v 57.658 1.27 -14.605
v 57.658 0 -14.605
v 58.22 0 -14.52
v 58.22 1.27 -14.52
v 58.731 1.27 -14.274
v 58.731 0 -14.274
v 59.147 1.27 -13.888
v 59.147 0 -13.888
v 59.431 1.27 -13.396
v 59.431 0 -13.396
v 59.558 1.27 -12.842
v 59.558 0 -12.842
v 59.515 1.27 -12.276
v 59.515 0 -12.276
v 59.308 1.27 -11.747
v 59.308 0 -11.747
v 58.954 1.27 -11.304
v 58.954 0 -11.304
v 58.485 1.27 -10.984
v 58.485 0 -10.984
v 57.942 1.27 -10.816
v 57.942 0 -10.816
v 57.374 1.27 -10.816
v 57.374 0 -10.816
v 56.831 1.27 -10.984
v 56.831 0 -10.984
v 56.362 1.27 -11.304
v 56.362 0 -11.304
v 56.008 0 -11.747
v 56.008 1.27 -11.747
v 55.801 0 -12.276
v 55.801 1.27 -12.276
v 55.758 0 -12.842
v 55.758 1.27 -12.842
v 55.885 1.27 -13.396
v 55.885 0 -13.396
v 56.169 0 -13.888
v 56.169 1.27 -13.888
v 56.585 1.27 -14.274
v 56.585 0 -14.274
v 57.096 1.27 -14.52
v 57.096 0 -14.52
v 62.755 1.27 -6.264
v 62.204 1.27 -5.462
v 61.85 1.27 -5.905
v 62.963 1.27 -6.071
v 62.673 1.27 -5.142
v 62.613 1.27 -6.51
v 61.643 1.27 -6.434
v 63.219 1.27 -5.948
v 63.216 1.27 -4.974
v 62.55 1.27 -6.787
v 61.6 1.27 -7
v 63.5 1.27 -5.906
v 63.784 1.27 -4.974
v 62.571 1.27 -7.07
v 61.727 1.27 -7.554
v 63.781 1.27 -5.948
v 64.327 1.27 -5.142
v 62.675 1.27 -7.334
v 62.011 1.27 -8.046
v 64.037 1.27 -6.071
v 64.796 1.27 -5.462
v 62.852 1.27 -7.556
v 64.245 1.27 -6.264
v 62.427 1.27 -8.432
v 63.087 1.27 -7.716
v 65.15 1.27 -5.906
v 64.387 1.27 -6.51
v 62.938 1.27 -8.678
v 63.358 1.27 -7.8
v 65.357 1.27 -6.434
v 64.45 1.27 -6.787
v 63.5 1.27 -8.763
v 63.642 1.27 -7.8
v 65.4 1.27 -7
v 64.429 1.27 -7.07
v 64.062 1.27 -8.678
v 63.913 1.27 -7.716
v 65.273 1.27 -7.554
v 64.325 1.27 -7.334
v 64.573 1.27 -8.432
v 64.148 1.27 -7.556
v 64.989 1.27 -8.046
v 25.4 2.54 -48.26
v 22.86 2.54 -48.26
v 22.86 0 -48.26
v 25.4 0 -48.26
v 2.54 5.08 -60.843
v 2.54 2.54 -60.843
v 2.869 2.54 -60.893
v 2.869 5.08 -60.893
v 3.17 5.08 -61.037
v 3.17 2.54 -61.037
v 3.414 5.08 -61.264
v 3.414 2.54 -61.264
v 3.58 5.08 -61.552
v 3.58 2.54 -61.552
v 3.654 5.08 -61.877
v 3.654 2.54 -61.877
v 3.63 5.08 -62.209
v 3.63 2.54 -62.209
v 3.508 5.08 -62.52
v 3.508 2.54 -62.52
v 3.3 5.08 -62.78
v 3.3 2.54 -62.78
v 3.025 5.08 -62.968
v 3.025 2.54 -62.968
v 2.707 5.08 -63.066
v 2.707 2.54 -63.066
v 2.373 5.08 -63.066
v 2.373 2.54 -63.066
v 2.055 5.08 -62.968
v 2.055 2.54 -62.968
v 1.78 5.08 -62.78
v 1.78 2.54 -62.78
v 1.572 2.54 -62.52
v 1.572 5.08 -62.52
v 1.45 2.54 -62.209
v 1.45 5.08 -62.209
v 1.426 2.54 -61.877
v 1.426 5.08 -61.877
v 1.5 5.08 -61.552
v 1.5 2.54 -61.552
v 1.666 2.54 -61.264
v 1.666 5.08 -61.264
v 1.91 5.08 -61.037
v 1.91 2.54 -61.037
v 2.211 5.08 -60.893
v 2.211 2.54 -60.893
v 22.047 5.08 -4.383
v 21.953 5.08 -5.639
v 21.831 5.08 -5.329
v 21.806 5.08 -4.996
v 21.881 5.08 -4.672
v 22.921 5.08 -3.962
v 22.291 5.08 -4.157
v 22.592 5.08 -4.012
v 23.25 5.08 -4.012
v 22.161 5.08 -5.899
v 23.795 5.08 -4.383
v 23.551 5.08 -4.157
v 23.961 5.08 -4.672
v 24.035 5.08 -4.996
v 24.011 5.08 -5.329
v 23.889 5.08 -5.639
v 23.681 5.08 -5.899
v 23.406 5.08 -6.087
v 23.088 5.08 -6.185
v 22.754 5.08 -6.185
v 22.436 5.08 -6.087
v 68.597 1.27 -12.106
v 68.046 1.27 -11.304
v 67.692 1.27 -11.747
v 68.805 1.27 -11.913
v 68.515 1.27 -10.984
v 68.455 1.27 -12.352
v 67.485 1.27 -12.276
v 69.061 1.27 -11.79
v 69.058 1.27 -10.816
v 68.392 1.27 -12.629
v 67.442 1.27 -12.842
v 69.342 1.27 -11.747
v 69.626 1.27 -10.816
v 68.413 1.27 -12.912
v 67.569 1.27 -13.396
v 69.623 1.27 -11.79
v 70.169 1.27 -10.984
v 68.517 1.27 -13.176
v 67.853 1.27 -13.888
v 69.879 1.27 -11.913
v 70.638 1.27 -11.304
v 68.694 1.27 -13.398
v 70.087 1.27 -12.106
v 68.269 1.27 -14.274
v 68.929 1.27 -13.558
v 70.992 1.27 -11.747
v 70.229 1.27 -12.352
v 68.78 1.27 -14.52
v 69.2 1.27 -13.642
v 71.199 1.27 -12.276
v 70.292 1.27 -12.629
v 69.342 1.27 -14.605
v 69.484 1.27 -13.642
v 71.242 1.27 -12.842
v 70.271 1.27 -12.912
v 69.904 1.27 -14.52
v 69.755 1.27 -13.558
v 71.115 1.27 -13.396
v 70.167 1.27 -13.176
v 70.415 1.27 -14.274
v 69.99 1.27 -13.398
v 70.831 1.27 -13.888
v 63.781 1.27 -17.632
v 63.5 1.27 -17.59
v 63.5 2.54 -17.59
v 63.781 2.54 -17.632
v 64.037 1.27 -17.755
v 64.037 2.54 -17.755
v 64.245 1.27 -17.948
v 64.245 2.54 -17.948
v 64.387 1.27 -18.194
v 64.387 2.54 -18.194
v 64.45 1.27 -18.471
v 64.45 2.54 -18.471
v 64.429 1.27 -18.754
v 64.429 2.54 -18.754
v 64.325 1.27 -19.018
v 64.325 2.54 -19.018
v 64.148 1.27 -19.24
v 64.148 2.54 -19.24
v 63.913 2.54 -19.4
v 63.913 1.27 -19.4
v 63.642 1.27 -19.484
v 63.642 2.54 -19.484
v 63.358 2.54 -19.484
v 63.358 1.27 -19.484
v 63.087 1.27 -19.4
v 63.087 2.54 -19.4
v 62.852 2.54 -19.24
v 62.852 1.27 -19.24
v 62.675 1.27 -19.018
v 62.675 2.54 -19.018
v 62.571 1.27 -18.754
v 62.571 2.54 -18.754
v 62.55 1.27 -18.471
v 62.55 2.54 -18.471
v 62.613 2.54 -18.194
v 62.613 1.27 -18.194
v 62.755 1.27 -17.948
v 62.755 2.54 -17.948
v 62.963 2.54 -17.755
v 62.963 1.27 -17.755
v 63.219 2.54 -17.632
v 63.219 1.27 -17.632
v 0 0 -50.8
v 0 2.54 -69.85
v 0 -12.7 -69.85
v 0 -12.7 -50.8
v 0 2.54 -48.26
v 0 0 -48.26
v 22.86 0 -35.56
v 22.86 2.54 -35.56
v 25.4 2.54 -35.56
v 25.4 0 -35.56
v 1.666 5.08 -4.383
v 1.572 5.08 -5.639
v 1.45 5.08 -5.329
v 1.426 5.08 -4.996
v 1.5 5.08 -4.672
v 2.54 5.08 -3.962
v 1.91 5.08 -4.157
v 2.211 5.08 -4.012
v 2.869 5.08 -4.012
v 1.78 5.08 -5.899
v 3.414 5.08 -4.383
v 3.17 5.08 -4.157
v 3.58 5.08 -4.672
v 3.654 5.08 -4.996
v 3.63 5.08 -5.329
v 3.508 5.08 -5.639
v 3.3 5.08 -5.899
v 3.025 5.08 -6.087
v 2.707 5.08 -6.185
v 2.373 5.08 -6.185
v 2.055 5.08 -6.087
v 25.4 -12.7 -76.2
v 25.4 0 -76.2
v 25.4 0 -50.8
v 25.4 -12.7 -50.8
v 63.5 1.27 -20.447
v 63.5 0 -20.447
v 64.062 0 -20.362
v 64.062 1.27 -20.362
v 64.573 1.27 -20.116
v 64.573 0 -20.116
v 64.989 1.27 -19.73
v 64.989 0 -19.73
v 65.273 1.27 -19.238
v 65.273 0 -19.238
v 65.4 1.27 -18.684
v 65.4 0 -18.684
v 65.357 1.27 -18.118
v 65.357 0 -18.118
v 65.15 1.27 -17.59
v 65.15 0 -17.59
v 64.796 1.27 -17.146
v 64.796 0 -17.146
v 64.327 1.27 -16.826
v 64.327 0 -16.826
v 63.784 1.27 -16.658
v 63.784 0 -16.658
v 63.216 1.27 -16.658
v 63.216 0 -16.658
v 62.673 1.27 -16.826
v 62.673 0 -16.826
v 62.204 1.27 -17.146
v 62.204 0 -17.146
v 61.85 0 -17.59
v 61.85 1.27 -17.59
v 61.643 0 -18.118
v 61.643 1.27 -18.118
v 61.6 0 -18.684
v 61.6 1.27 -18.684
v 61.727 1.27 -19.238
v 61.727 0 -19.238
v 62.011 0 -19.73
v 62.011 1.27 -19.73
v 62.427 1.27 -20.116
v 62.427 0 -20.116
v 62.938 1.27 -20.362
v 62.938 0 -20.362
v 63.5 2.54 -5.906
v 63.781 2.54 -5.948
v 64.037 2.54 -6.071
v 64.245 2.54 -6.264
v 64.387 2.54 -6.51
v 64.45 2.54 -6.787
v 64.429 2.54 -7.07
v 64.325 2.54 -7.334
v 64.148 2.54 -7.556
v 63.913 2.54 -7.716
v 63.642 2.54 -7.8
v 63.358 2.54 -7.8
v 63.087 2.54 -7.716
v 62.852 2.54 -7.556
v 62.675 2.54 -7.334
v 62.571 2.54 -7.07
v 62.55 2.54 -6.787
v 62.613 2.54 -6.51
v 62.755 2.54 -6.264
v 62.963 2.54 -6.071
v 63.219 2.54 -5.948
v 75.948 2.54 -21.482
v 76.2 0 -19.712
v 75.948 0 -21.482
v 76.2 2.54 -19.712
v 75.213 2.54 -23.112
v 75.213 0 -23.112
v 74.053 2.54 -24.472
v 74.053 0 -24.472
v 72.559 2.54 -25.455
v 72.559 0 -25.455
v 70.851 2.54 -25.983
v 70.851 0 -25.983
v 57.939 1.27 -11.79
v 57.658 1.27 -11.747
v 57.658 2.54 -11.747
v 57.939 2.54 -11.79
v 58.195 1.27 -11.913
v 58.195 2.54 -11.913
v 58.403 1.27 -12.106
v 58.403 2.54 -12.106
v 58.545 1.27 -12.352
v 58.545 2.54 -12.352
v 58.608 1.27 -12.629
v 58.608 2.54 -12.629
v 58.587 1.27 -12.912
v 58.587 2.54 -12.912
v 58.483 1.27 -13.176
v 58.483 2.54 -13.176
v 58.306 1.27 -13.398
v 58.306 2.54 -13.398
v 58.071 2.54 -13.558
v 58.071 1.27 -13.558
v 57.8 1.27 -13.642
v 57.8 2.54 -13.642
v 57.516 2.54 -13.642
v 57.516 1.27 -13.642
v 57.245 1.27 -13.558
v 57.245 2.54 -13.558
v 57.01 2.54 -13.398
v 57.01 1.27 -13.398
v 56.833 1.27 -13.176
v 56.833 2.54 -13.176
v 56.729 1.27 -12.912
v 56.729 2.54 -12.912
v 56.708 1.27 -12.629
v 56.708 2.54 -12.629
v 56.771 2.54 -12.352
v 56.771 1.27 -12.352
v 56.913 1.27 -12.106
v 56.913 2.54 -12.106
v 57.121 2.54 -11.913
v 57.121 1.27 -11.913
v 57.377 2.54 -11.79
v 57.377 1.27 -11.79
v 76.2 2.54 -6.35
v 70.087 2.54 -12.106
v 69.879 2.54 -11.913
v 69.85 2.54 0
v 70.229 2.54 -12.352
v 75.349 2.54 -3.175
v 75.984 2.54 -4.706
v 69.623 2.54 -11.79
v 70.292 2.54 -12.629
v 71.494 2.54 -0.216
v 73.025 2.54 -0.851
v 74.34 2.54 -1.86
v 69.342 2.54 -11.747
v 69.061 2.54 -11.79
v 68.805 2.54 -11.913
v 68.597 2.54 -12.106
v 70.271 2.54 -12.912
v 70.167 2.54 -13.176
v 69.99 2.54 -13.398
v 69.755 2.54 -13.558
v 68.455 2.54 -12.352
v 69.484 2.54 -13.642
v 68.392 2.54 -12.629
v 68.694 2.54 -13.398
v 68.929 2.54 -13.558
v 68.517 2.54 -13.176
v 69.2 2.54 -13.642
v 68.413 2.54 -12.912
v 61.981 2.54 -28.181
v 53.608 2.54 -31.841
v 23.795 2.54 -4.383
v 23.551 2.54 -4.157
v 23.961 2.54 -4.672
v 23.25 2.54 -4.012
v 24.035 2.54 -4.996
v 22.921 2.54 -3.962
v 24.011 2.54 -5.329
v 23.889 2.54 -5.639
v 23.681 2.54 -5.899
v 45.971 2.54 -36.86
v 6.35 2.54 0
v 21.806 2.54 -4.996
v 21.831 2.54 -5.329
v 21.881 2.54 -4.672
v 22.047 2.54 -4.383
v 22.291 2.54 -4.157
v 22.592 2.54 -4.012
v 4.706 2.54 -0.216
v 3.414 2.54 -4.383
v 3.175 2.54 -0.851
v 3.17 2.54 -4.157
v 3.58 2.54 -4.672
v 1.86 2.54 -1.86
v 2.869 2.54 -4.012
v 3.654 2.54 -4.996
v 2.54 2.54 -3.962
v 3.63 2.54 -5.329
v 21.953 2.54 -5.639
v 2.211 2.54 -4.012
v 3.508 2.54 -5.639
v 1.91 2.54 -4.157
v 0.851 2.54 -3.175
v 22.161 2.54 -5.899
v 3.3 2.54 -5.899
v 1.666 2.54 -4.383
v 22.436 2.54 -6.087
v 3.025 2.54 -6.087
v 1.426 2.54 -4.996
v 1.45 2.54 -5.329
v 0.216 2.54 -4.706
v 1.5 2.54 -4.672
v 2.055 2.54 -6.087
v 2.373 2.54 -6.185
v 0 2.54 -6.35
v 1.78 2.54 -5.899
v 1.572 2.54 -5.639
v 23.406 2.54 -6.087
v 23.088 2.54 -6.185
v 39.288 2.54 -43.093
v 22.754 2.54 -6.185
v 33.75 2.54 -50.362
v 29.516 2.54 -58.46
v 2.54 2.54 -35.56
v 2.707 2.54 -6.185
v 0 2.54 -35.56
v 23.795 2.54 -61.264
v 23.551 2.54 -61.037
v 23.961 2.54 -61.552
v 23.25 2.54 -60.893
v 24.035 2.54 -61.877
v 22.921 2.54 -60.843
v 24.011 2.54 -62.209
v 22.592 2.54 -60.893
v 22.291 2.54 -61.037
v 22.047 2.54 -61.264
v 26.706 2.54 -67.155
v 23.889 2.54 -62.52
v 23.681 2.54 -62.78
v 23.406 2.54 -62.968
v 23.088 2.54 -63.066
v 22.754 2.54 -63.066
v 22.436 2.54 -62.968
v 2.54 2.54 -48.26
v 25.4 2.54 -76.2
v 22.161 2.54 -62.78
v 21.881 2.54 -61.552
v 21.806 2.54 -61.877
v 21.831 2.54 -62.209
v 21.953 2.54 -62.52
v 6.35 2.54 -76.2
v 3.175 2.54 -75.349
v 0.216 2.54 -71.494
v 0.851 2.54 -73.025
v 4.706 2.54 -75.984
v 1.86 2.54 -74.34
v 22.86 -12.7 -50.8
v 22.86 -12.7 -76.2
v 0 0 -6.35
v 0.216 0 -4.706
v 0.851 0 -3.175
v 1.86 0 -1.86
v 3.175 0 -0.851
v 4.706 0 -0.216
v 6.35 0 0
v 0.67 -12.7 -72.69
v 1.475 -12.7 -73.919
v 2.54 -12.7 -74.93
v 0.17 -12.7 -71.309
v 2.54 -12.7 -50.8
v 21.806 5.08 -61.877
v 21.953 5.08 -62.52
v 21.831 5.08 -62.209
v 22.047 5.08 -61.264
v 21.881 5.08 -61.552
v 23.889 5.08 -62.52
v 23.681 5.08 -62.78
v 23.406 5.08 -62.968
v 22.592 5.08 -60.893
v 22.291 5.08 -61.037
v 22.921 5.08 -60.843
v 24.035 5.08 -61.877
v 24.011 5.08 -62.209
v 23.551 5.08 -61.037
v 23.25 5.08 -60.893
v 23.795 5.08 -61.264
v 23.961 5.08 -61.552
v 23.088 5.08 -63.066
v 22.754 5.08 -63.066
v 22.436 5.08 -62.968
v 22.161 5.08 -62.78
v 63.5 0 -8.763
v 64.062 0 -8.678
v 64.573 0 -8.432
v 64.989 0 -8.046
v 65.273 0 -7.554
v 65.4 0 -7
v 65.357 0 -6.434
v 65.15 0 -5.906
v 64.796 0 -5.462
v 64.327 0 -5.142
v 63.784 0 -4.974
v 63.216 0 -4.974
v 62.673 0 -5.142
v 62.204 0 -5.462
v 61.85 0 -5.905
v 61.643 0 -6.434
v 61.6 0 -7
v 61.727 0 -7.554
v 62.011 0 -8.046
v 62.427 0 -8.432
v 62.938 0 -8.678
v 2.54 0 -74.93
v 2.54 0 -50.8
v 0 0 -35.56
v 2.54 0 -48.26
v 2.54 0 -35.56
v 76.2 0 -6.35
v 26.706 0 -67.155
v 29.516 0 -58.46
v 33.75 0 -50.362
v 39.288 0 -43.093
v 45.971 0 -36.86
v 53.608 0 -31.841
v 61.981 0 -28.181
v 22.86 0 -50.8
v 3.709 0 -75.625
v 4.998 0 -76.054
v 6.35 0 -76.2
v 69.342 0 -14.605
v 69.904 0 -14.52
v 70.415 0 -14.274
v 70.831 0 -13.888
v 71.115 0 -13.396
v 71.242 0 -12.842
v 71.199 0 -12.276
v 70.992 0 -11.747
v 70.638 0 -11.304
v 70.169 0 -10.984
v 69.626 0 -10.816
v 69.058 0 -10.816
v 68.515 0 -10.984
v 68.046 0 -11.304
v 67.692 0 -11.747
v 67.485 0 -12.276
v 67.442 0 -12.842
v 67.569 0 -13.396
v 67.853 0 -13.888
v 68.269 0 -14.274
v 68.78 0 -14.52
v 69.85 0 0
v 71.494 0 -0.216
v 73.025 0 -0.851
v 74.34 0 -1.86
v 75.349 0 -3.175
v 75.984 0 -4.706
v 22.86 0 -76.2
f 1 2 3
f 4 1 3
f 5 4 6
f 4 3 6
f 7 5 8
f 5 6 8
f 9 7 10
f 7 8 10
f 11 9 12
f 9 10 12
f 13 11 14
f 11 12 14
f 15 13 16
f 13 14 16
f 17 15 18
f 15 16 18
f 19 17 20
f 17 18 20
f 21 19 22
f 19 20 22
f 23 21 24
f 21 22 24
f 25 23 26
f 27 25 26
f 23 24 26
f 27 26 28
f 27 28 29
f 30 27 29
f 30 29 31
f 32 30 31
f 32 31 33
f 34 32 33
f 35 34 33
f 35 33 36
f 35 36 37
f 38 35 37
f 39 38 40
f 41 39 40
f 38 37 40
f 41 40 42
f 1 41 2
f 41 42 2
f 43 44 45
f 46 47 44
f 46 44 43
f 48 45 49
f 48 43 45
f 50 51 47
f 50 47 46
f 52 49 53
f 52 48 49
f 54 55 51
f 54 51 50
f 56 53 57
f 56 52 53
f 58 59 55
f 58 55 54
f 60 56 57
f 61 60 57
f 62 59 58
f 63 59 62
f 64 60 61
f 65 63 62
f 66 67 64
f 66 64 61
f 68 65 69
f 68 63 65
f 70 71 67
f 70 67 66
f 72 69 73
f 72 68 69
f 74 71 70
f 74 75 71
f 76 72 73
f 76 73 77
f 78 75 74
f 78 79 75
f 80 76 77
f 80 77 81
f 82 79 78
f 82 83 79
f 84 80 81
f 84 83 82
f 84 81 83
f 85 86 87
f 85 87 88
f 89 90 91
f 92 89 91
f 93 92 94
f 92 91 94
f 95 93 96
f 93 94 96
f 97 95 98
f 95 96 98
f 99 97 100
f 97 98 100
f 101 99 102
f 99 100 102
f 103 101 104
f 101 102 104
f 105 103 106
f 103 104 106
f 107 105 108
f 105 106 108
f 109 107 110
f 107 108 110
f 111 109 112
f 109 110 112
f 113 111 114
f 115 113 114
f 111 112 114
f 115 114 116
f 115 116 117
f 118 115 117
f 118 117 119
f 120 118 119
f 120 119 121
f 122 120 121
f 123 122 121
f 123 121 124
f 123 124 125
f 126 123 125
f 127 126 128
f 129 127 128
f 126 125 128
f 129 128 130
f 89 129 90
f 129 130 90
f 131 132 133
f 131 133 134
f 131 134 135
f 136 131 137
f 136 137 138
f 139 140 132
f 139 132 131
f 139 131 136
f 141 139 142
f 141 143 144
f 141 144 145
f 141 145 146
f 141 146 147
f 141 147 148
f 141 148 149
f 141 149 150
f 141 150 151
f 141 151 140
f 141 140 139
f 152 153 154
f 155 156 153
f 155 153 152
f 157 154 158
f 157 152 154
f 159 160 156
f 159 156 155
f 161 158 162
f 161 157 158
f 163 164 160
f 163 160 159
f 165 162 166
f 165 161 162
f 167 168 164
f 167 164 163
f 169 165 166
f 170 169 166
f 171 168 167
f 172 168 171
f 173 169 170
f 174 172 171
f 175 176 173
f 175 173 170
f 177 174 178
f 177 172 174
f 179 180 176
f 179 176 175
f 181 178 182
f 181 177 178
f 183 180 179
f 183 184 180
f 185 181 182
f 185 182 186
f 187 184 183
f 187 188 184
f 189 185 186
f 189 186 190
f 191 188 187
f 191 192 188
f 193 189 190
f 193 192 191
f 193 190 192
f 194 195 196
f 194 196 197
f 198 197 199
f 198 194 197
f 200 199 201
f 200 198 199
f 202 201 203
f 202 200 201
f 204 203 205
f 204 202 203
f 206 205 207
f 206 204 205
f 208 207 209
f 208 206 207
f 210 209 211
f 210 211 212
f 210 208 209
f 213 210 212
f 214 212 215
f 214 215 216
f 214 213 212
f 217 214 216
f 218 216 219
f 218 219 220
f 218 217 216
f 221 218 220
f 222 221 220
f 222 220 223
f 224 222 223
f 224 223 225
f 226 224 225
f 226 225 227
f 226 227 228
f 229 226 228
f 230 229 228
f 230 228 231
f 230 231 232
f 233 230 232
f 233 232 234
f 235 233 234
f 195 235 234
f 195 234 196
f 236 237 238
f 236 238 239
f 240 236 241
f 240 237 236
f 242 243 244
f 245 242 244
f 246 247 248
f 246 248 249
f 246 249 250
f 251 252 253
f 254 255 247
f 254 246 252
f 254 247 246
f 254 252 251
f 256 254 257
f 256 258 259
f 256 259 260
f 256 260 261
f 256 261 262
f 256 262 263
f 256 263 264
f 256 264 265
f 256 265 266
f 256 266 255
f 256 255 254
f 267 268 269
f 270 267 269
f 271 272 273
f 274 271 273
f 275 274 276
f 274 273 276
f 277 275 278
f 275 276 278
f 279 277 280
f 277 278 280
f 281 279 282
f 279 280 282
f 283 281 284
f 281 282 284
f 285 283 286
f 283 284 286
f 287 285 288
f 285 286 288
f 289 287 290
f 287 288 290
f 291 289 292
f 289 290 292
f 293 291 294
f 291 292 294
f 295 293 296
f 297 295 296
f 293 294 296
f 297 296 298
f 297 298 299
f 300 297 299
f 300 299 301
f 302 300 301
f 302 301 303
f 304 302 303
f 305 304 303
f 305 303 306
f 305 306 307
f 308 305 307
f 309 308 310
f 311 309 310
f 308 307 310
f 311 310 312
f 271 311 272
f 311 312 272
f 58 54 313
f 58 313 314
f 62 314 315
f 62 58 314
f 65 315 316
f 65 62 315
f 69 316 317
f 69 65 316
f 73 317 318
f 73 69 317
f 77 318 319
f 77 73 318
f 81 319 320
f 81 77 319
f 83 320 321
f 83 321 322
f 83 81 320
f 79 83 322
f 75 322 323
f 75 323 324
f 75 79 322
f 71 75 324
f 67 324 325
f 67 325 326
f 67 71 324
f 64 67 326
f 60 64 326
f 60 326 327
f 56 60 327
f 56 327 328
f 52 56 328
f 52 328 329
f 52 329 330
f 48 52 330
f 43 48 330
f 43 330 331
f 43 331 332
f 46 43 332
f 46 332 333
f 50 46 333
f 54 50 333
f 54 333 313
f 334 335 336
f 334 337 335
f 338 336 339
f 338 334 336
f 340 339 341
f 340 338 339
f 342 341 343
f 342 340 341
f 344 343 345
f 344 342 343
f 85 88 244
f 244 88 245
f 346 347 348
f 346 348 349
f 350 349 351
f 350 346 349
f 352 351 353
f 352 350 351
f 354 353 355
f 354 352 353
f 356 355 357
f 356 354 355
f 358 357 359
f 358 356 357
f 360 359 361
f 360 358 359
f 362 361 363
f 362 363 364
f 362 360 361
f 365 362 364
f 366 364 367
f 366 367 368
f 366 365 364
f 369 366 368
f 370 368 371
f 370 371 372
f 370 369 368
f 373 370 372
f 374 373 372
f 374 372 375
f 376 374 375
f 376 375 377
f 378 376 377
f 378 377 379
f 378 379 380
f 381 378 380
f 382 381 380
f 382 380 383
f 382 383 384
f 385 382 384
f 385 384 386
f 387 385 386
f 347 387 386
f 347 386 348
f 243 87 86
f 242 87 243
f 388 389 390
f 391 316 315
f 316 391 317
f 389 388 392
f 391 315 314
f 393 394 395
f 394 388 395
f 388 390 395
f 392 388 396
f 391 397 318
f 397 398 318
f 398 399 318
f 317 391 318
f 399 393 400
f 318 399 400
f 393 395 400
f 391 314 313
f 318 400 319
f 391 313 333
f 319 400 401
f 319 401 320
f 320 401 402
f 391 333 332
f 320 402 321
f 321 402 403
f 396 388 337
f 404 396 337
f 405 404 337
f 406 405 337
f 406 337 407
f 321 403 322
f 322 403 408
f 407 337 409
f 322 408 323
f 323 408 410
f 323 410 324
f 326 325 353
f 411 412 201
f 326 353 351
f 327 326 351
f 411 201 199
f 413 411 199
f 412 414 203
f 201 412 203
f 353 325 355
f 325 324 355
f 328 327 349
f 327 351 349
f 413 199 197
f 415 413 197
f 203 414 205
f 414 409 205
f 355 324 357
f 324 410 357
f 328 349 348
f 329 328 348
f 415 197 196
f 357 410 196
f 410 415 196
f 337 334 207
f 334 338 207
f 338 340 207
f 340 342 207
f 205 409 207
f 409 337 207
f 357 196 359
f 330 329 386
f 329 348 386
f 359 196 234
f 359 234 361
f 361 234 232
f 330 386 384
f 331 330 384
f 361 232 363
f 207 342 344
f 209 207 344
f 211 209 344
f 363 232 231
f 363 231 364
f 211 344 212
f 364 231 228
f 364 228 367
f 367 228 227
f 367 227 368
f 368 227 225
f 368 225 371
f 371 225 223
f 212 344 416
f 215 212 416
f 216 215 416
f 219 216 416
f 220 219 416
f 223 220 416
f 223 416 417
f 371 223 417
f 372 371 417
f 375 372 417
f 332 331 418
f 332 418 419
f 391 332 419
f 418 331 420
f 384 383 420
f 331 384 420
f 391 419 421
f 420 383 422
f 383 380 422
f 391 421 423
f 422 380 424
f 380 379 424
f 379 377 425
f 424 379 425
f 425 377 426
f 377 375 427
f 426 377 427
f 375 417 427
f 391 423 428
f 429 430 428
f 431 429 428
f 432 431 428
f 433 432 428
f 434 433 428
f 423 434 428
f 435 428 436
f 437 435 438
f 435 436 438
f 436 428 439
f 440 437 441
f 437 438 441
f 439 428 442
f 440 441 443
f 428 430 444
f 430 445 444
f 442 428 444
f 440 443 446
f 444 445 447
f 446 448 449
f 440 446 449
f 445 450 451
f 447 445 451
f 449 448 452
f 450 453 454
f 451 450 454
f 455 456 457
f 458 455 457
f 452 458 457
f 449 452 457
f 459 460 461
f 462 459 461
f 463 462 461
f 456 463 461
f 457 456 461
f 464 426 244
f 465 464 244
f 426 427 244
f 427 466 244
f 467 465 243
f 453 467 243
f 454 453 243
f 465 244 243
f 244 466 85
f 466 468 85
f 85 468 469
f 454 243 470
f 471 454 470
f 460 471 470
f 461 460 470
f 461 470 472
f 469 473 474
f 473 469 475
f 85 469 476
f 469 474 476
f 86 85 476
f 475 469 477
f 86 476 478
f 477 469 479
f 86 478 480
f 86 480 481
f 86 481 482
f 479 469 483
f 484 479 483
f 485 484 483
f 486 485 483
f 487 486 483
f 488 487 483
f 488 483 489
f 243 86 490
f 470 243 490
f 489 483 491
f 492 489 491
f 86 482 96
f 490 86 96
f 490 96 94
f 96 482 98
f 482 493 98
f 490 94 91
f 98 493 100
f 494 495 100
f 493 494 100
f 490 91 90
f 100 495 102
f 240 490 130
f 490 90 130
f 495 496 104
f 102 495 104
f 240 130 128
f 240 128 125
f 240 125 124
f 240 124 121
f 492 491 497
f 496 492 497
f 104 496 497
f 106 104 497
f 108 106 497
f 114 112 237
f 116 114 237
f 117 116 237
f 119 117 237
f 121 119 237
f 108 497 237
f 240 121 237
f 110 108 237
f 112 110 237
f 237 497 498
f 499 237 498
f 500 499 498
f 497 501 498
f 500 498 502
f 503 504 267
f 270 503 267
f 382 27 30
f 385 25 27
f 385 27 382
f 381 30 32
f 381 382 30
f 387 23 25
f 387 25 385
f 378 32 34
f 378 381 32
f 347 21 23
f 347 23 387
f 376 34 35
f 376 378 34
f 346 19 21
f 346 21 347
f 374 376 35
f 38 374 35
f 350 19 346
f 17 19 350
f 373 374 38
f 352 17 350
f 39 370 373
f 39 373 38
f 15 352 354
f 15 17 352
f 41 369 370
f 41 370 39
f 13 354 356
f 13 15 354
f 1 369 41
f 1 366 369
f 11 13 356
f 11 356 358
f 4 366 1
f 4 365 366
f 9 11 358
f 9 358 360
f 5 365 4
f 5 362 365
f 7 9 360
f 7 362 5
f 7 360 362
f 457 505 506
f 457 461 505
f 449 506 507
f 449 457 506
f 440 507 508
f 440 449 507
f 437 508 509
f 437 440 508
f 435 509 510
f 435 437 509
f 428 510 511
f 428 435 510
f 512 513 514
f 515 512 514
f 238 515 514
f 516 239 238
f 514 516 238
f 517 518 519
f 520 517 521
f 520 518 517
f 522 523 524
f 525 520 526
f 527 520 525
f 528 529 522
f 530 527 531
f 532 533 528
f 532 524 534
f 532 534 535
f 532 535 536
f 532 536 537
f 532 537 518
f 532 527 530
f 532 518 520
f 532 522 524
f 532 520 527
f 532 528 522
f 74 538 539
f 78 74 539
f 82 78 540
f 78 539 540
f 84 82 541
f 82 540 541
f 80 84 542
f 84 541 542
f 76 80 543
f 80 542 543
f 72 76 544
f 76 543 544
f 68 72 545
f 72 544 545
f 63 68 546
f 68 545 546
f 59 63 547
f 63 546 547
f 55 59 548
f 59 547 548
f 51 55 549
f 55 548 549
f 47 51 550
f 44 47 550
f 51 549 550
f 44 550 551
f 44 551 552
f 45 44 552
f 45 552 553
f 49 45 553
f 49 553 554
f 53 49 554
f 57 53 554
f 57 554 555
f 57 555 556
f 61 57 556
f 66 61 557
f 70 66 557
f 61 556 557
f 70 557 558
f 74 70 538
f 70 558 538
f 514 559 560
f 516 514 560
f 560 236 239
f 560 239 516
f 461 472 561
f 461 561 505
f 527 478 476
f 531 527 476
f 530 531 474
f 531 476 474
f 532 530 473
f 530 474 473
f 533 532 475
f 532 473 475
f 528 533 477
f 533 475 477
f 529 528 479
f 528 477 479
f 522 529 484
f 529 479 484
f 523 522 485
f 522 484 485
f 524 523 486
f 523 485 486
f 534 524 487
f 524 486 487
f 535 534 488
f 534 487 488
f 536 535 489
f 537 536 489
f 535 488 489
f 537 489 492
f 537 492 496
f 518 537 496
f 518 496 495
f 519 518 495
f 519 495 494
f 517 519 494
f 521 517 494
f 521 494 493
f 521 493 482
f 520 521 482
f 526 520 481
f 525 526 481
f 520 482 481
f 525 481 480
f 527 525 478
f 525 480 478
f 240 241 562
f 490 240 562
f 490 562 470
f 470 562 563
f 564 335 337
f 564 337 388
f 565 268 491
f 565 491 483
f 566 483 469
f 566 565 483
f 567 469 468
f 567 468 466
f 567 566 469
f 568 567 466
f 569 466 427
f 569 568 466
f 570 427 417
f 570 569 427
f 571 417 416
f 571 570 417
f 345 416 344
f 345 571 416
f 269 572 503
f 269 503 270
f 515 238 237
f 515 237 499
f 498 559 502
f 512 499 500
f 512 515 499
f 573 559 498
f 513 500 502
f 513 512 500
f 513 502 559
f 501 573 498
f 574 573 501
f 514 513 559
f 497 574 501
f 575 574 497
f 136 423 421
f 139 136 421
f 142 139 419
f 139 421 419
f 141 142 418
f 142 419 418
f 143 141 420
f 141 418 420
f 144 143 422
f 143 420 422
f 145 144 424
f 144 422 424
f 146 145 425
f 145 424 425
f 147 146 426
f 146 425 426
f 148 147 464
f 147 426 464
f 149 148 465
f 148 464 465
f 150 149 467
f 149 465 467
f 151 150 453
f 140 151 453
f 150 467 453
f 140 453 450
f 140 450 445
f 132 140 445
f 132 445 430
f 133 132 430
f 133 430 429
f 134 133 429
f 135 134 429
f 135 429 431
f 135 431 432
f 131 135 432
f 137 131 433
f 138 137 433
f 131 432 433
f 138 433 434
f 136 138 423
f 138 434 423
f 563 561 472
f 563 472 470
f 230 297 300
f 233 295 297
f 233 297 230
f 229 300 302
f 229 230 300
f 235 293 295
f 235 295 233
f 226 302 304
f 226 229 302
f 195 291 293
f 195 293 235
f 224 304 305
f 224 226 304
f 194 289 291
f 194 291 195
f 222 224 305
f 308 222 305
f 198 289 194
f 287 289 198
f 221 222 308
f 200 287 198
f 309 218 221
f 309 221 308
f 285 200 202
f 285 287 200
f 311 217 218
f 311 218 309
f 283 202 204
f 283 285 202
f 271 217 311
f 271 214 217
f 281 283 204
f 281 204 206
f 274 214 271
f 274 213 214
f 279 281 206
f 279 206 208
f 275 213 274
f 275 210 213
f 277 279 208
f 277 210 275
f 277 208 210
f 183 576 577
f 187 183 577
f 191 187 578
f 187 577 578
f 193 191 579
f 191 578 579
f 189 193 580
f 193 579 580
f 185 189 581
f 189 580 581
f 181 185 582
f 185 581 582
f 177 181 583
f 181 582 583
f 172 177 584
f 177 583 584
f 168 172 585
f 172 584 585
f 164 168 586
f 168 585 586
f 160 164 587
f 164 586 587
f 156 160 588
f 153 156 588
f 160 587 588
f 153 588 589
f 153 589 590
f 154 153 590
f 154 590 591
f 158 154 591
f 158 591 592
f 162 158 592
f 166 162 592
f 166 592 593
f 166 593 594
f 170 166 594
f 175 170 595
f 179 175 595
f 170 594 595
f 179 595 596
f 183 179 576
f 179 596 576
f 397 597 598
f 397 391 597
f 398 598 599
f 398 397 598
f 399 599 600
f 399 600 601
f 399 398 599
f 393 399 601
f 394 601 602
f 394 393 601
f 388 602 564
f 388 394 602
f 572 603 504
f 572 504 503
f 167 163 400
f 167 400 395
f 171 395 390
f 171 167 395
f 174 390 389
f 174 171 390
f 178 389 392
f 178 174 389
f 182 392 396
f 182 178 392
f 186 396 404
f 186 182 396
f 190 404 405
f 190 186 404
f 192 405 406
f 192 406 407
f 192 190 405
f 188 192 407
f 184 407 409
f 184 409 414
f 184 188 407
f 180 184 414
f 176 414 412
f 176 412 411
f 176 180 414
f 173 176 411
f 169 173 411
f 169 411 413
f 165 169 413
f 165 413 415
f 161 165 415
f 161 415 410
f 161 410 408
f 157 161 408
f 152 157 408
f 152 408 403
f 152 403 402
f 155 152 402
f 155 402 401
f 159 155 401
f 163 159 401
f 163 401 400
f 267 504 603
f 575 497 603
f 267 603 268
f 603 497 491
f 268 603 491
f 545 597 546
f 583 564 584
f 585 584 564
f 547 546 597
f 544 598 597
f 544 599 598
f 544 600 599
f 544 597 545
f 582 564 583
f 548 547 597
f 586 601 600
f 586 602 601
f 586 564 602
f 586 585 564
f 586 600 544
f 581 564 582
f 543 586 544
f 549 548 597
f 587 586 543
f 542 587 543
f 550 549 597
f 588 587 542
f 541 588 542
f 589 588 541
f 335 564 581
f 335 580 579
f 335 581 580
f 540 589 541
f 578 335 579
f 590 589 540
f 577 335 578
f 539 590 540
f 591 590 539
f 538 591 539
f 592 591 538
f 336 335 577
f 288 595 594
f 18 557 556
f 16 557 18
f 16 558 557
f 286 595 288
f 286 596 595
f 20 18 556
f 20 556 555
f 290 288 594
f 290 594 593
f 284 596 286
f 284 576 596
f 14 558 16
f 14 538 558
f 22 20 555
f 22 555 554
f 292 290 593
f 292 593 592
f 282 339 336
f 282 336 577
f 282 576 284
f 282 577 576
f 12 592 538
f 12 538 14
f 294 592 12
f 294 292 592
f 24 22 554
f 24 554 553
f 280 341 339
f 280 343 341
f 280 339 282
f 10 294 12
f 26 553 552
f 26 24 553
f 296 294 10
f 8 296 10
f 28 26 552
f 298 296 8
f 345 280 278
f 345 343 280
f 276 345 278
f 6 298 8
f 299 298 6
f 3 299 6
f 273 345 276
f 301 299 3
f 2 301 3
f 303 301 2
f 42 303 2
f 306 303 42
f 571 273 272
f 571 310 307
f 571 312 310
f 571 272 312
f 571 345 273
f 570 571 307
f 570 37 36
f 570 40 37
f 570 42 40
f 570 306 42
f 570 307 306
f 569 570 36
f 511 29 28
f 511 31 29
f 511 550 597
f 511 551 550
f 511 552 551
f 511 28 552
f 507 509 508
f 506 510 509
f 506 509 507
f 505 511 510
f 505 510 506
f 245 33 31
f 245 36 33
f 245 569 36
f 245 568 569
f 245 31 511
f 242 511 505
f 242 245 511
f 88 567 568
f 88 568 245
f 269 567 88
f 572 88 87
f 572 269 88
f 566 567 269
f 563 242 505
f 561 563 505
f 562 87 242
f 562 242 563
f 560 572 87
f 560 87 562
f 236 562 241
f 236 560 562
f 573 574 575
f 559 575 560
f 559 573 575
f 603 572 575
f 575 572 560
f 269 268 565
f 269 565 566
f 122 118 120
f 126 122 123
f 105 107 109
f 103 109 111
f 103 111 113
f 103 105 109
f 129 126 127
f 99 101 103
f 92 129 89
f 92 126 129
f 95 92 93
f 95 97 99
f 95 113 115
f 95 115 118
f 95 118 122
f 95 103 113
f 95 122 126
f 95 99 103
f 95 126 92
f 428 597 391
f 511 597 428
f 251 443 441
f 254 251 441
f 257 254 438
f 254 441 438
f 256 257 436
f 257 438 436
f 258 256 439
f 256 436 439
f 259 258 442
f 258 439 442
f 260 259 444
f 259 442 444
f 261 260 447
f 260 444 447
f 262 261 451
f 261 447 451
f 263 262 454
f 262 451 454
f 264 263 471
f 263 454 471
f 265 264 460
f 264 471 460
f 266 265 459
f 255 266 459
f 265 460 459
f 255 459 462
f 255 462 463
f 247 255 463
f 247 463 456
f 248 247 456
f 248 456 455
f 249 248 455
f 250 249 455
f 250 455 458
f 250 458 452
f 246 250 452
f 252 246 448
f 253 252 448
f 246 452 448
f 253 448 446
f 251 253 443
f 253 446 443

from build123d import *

# Parameters (mm, degrees)
SKETCH1_R           = 0.9525
BOSS_EXTRUDE1_DEPTH = 2.54
SKETCH2_W           = 2.54
SKETCH2_H           = 25.4
BOSS_EXTRUDE2_DEPTH = 12.7
FILLET2_R           = 6.35
FILLET3_R           = 6.35
FILLET4_R           = 6.35
FILLET5_R           = 6.35
SKETCH3_R           = 1.905
CUT_EXTRUDE1_DEPTH  = 1.27
SKETCH4_W           = 2.54
SKETCH4_H           = 12.7
CUT_EXTRUDE2_DEPTH  = 109.508847566
SKETCH5_R           = 1.1176
BOSS_EXTRUDE3_DEPTH = 2.54


with BuildPart() as part:
    # Sketch1 → Boss-Extrude1 (new body)
    with BuildSketch(Plane(origin=(0, 0, 0), x_dir=(1, 0, 0), z_dir=(0, 1, 0))):
        with BuildLine():
            Line((0, 0), (0, 76.2))
            Line((0, 76.2), (25.4, 76.2))
            ThreePointArc((25.4, 76.2), (41.142937212, 41.142937212), (76.2, 25.4))
            Line((76.2, 25.4), (76.2, 0))
            Line((76.2, 0), (0, 0))
        make_face()
        with Locations(Location((63.5, 6.858, 0), (0, 0, 270))):
            Circle(SKETCH1_R, mode=Mode.SUBTRACT)
        with Locations(Location((57.658, 12.7, 0), (0, 0, 270))):
            Circle(SKETCH1_R, mode=Mode.SUBTRACT)
        with Locations(Location((63.5, 18.542, 0), (0, 0, 270))):
            Circle(SKETCH1_R, mode=Mode.SUBTRACT)
        with Locations(Location((69.342, 12.7, 0), (0, 0, 270))):
            Circle(SKETCH1_R, mode=Mode.SUBTRACT)
    extrude(amount=BOSS_EXTRUDE1_DEPTH)

    # Sketch2 → Boss-Extrude2 (add)
    with BuildSketch(Plane.XZ):
        with Locations((1.27, -63.5)):
            Rectangle(SKETCH2_W, SKETCH2_H)
        with Locations((24.13, -63.5)):
            Rectangle(SKETCH2_W, SKETCH2_H)
    extrude(amount=BOSS_EXTRUDE2_DEPTH)

    # Fillet2
    fillet2_edges = [part.edges().sort_by_distance(p)[0] for p in [
        (0, -5.08, -76.2),
    ]]
    fillet(fillet2_edges, radius=FILLET2_R)

    # Fillet3
    fillet3_edges = [part.edges().sort_by_distance(p)[0] for p in [
        (0, 1.27, 0),
    ]]
    fillet(fillet3_edges, radius=FILLET3_R)

    # Fillet4
    fillet4_edges = [part.edges().sort_by_distance(p)[0] for p in [
        (76.2, 1.27, 0),
    ]]
    fillet(fillet4_edges, radius=FILLET4_R)

    # Fillet5
    fillet5_edges = [part.edges().sort_by_distance(p)[0] for p in [
        (76.2, 1.27, -25.4),
    ]]
    fillet(fillet5_edges, radius=FILLET5_R)

    # Sketch3 → Cut-Extrude1 (cut)
    with BuildSketch(Plane.XZ):
        with Locations(Location((63.5, -6.858, 0), (0, 0, 270))):
            Circle(SKETCH3_R)
        with Locations(Location((69.342, -12.7, 0), (0, 0, 270))):
            Circle(SKETCH3_R)
        with Locations(Location((57.658, -12.7, 0), (0, 0, 270))):
            Circle(SKETCH3_R)
        with Locations(Location((63.5, -18.542, 0), (0, 0, 270))):
            Circle(SKETCH3_R)
    extrude(amount=-CUT_EXTRUDE1_DEPTH, mode=Mode.SUBTRACT)

    # Sketch4 → Cut-Extrude2 (cut, through all)
    with BuildSketch(Plane.XZ):
        with Locations((24.13, -41.91)):
            Rectangle(SKETCH4_W, SKETCH4_H)
        with Locations((1.27, -41.91)):
            Rectangle(SKETCH4_W, SKETCH4_H)
    extrude(amount=-CUT_EXTRUDE2_DEPTH, mode=Mode.SUBTRACT)

    # Sketch5 → Boss-Extrude3 (add)
    with BuildSketch(Plane(origin=(0, 2.54, 0), x_dir=(1, 0, 0), z_dir=(0, 1, 0))):
        with Locations(Location((2.54, 5.08, 0), (0, 0, 270))):
            Circle(SKETCH5_R)
        with Locations(Location((2.54, 61.96076, 0), (0, 0, 270))):
            Circle(SKETCH5_R)
        with Locations(Location((22.92096, 61.96076, 0), (0, 0, 270))):
            Circle(SKETCH5_R)
        with Locations(Location((22.92096, 5.08, 0), (0, 0, 270))):
            Circle(SKETCH5_R)
    extrude(amount=BOSS_EXTRUDE3_DEPTH)


solid = part.part
